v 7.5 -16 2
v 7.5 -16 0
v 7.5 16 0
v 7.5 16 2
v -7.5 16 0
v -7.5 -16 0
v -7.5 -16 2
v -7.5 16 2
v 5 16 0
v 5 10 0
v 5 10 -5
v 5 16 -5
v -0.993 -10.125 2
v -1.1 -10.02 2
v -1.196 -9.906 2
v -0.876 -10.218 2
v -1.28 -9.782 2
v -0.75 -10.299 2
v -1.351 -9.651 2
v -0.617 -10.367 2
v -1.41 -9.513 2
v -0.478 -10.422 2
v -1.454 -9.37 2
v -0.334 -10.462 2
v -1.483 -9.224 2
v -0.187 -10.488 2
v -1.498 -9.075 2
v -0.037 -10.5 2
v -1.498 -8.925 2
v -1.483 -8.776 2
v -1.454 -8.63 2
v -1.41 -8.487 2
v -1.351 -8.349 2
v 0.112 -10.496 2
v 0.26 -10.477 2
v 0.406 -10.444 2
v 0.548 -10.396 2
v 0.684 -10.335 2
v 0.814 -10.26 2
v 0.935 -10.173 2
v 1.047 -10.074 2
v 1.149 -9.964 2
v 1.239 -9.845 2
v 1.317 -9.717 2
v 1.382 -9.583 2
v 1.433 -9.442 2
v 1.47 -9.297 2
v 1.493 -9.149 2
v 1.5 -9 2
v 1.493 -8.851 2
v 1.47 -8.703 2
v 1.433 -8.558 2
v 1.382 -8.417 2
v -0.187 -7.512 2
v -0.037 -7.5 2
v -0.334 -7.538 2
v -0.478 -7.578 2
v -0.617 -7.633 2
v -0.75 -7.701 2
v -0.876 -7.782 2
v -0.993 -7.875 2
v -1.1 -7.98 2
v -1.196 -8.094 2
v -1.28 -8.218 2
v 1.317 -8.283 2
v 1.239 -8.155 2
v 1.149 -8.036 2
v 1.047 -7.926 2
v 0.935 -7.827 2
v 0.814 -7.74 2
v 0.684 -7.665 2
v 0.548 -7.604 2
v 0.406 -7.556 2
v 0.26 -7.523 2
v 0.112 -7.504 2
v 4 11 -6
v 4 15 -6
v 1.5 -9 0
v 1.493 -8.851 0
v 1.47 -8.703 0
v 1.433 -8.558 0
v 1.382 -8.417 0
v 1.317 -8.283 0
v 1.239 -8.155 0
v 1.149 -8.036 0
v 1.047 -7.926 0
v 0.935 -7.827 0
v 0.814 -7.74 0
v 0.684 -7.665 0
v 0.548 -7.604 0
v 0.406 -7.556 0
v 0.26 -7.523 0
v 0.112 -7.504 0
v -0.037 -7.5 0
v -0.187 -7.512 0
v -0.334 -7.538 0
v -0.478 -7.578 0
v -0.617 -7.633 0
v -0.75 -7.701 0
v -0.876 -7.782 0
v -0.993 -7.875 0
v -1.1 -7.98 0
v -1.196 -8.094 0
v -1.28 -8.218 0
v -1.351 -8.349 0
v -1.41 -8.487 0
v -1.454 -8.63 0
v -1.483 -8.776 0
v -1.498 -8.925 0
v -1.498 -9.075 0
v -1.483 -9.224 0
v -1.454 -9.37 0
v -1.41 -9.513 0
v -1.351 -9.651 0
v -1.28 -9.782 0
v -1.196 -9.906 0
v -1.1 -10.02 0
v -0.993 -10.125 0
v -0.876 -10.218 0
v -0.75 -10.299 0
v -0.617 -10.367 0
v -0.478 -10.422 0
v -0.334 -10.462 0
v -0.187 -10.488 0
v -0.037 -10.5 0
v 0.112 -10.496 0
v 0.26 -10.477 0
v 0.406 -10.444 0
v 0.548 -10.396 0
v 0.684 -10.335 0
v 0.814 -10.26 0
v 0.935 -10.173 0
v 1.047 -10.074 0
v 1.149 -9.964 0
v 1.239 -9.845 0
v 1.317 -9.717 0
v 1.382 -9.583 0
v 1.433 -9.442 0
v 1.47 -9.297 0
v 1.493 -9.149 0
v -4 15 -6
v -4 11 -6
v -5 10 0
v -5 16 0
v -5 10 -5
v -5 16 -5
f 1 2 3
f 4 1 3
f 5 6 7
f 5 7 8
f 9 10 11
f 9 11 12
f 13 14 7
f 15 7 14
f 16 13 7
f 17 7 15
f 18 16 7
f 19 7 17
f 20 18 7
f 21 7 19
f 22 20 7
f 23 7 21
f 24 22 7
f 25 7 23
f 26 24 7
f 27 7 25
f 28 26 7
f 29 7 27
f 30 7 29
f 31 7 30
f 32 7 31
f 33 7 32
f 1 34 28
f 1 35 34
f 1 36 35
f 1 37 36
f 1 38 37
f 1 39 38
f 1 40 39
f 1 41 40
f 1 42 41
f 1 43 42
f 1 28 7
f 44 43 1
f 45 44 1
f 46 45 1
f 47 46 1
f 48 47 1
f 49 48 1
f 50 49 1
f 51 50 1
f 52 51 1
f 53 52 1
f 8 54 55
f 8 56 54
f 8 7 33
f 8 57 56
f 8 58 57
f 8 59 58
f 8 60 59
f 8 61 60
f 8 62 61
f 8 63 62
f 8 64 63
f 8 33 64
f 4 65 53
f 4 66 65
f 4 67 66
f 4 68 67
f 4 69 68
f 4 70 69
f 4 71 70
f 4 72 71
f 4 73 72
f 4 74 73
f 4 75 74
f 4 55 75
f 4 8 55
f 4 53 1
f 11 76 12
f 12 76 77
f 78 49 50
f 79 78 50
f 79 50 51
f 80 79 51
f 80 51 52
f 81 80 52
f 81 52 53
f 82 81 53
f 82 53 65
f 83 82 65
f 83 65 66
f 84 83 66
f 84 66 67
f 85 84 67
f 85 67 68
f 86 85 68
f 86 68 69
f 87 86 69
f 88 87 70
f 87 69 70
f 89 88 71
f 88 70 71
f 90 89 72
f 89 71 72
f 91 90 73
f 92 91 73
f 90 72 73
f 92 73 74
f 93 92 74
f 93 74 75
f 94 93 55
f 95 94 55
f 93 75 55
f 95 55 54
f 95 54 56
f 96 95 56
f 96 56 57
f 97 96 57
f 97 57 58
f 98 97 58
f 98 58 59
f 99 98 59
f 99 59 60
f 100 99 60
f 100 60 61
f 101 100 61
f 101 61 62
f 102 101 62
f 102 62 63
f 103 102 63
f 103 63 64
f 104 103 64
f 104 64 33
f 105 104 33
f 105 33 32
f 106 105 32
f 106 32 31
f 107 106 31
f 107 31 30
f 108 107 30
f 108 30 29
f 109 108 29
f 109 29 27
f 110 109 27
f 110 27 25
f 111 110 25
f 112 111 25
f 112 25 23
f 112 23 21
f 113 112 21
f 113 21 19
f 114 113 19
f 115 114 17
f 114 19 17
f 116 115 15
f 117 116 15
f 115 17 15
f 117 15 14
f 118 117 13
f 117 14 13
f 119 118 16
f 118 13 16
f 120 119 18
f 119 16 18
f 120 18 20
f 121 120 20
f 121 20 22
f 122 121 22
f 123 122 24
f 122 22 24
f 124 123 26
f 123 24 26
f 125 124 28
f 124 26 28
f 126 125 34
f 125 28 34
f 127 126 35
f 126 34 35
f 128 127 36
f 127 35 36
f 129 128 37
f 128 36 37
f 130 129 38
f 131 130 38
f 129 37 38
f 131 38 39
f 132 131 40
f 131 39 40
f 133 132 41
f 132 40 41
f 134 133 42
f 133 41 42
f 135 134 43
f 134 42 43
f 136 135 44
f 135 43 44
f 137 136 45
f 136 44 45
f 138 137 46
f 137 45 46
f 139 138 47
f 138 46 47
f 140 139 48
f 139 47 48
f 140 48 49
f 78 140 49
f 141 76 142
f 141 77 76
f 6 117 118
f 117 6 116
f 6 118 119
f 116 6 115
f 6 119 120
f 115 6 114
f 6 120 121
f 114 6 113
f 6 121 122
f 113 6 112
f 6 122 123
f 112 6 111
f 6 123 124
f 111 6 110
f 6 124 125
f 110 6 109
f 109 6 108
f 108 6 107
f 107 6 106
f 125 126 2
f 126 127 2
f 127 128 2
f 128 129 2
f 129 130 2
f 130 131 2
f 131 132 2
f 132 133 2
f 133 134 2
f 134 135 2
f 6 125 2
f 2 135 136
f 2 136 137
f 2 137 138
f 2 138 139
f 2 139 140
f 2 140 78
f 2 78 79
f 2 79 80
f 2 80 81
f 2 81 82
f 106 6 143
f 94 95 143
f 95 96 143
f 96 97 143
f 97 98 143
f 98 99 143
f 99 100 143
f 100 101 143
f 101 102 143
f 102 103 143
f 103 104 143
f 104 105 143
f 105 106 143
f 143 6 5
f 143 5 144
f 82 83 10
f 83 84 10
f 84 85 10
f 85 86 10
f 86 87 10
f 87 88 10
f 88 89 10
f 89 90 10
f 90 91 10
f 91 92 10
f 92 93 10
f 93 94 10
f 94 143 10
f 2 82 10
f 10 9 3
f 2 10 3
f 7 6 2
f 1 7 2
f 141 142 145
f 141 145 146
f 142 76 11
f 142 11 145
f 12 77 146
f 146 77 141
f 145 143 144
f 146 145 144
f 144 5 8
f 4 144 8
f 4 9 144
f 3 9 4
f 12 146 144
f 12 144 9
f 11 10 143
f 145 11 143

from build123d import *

# Parameters (mm, degrees)
SKETCH_1_W          = 15
SKETCH_1_H          = 32
EXTRUDE_1_DEPTH     = 2
SKETCH_2_W          = 10
SKETCH_2_H          = 6
EXTRUDE_2_DEPTH     = 6
CHAMFER_1_SIZE      = 1
SKETCH_3_R          = 1.5
CUT_EXTRUDE_1_DEPTH = 28


with BuildPart() as part:
    # 草图1 → 凸台-拉伸1 (new body)
    with BuildSketch(Plane.XY):
        Rectangle(SKETCH_1_W, SKETCH_1_H)
    extrude(amount=EXTRUDE_1_DEPTH)

    # 草图2 → 凸台-拉伸2 (add)
    with BuildSketch(Plane(origin=(0, 0, 0), x_dir=(-1, 0, 0), z_dir=(0, 0, -1))):
        with Locations((0, 13)):
            Rectangle(SKETCH_2_W, SKETCH_2_H)
    extrude(amount=EXTRUDE_2_DEPTH)

    # 倒角1
    chamfer_1_edges = [part.edges().sort_by_distance(p)[0] for p in [
        (0, 10, -6),
        (-5, 13, -6),
        (0, 16, -6),
        (5, 13, -6),
    ]]
    chamfer(chamfer_1_edges, length=CHAMFER_1_SIZE)

    # 草图3 → 切除-拉伸1 (cut)
    with BuildSketch(Plane.XY.offset(2)):
        with Locations((0, -9)):
            Circle(SKETCH_3_R)
    extrude(amount=-CUT_EXTRUDE_1_DEPTH, mode=Mode.SUBTRACT)


solid = part.part
